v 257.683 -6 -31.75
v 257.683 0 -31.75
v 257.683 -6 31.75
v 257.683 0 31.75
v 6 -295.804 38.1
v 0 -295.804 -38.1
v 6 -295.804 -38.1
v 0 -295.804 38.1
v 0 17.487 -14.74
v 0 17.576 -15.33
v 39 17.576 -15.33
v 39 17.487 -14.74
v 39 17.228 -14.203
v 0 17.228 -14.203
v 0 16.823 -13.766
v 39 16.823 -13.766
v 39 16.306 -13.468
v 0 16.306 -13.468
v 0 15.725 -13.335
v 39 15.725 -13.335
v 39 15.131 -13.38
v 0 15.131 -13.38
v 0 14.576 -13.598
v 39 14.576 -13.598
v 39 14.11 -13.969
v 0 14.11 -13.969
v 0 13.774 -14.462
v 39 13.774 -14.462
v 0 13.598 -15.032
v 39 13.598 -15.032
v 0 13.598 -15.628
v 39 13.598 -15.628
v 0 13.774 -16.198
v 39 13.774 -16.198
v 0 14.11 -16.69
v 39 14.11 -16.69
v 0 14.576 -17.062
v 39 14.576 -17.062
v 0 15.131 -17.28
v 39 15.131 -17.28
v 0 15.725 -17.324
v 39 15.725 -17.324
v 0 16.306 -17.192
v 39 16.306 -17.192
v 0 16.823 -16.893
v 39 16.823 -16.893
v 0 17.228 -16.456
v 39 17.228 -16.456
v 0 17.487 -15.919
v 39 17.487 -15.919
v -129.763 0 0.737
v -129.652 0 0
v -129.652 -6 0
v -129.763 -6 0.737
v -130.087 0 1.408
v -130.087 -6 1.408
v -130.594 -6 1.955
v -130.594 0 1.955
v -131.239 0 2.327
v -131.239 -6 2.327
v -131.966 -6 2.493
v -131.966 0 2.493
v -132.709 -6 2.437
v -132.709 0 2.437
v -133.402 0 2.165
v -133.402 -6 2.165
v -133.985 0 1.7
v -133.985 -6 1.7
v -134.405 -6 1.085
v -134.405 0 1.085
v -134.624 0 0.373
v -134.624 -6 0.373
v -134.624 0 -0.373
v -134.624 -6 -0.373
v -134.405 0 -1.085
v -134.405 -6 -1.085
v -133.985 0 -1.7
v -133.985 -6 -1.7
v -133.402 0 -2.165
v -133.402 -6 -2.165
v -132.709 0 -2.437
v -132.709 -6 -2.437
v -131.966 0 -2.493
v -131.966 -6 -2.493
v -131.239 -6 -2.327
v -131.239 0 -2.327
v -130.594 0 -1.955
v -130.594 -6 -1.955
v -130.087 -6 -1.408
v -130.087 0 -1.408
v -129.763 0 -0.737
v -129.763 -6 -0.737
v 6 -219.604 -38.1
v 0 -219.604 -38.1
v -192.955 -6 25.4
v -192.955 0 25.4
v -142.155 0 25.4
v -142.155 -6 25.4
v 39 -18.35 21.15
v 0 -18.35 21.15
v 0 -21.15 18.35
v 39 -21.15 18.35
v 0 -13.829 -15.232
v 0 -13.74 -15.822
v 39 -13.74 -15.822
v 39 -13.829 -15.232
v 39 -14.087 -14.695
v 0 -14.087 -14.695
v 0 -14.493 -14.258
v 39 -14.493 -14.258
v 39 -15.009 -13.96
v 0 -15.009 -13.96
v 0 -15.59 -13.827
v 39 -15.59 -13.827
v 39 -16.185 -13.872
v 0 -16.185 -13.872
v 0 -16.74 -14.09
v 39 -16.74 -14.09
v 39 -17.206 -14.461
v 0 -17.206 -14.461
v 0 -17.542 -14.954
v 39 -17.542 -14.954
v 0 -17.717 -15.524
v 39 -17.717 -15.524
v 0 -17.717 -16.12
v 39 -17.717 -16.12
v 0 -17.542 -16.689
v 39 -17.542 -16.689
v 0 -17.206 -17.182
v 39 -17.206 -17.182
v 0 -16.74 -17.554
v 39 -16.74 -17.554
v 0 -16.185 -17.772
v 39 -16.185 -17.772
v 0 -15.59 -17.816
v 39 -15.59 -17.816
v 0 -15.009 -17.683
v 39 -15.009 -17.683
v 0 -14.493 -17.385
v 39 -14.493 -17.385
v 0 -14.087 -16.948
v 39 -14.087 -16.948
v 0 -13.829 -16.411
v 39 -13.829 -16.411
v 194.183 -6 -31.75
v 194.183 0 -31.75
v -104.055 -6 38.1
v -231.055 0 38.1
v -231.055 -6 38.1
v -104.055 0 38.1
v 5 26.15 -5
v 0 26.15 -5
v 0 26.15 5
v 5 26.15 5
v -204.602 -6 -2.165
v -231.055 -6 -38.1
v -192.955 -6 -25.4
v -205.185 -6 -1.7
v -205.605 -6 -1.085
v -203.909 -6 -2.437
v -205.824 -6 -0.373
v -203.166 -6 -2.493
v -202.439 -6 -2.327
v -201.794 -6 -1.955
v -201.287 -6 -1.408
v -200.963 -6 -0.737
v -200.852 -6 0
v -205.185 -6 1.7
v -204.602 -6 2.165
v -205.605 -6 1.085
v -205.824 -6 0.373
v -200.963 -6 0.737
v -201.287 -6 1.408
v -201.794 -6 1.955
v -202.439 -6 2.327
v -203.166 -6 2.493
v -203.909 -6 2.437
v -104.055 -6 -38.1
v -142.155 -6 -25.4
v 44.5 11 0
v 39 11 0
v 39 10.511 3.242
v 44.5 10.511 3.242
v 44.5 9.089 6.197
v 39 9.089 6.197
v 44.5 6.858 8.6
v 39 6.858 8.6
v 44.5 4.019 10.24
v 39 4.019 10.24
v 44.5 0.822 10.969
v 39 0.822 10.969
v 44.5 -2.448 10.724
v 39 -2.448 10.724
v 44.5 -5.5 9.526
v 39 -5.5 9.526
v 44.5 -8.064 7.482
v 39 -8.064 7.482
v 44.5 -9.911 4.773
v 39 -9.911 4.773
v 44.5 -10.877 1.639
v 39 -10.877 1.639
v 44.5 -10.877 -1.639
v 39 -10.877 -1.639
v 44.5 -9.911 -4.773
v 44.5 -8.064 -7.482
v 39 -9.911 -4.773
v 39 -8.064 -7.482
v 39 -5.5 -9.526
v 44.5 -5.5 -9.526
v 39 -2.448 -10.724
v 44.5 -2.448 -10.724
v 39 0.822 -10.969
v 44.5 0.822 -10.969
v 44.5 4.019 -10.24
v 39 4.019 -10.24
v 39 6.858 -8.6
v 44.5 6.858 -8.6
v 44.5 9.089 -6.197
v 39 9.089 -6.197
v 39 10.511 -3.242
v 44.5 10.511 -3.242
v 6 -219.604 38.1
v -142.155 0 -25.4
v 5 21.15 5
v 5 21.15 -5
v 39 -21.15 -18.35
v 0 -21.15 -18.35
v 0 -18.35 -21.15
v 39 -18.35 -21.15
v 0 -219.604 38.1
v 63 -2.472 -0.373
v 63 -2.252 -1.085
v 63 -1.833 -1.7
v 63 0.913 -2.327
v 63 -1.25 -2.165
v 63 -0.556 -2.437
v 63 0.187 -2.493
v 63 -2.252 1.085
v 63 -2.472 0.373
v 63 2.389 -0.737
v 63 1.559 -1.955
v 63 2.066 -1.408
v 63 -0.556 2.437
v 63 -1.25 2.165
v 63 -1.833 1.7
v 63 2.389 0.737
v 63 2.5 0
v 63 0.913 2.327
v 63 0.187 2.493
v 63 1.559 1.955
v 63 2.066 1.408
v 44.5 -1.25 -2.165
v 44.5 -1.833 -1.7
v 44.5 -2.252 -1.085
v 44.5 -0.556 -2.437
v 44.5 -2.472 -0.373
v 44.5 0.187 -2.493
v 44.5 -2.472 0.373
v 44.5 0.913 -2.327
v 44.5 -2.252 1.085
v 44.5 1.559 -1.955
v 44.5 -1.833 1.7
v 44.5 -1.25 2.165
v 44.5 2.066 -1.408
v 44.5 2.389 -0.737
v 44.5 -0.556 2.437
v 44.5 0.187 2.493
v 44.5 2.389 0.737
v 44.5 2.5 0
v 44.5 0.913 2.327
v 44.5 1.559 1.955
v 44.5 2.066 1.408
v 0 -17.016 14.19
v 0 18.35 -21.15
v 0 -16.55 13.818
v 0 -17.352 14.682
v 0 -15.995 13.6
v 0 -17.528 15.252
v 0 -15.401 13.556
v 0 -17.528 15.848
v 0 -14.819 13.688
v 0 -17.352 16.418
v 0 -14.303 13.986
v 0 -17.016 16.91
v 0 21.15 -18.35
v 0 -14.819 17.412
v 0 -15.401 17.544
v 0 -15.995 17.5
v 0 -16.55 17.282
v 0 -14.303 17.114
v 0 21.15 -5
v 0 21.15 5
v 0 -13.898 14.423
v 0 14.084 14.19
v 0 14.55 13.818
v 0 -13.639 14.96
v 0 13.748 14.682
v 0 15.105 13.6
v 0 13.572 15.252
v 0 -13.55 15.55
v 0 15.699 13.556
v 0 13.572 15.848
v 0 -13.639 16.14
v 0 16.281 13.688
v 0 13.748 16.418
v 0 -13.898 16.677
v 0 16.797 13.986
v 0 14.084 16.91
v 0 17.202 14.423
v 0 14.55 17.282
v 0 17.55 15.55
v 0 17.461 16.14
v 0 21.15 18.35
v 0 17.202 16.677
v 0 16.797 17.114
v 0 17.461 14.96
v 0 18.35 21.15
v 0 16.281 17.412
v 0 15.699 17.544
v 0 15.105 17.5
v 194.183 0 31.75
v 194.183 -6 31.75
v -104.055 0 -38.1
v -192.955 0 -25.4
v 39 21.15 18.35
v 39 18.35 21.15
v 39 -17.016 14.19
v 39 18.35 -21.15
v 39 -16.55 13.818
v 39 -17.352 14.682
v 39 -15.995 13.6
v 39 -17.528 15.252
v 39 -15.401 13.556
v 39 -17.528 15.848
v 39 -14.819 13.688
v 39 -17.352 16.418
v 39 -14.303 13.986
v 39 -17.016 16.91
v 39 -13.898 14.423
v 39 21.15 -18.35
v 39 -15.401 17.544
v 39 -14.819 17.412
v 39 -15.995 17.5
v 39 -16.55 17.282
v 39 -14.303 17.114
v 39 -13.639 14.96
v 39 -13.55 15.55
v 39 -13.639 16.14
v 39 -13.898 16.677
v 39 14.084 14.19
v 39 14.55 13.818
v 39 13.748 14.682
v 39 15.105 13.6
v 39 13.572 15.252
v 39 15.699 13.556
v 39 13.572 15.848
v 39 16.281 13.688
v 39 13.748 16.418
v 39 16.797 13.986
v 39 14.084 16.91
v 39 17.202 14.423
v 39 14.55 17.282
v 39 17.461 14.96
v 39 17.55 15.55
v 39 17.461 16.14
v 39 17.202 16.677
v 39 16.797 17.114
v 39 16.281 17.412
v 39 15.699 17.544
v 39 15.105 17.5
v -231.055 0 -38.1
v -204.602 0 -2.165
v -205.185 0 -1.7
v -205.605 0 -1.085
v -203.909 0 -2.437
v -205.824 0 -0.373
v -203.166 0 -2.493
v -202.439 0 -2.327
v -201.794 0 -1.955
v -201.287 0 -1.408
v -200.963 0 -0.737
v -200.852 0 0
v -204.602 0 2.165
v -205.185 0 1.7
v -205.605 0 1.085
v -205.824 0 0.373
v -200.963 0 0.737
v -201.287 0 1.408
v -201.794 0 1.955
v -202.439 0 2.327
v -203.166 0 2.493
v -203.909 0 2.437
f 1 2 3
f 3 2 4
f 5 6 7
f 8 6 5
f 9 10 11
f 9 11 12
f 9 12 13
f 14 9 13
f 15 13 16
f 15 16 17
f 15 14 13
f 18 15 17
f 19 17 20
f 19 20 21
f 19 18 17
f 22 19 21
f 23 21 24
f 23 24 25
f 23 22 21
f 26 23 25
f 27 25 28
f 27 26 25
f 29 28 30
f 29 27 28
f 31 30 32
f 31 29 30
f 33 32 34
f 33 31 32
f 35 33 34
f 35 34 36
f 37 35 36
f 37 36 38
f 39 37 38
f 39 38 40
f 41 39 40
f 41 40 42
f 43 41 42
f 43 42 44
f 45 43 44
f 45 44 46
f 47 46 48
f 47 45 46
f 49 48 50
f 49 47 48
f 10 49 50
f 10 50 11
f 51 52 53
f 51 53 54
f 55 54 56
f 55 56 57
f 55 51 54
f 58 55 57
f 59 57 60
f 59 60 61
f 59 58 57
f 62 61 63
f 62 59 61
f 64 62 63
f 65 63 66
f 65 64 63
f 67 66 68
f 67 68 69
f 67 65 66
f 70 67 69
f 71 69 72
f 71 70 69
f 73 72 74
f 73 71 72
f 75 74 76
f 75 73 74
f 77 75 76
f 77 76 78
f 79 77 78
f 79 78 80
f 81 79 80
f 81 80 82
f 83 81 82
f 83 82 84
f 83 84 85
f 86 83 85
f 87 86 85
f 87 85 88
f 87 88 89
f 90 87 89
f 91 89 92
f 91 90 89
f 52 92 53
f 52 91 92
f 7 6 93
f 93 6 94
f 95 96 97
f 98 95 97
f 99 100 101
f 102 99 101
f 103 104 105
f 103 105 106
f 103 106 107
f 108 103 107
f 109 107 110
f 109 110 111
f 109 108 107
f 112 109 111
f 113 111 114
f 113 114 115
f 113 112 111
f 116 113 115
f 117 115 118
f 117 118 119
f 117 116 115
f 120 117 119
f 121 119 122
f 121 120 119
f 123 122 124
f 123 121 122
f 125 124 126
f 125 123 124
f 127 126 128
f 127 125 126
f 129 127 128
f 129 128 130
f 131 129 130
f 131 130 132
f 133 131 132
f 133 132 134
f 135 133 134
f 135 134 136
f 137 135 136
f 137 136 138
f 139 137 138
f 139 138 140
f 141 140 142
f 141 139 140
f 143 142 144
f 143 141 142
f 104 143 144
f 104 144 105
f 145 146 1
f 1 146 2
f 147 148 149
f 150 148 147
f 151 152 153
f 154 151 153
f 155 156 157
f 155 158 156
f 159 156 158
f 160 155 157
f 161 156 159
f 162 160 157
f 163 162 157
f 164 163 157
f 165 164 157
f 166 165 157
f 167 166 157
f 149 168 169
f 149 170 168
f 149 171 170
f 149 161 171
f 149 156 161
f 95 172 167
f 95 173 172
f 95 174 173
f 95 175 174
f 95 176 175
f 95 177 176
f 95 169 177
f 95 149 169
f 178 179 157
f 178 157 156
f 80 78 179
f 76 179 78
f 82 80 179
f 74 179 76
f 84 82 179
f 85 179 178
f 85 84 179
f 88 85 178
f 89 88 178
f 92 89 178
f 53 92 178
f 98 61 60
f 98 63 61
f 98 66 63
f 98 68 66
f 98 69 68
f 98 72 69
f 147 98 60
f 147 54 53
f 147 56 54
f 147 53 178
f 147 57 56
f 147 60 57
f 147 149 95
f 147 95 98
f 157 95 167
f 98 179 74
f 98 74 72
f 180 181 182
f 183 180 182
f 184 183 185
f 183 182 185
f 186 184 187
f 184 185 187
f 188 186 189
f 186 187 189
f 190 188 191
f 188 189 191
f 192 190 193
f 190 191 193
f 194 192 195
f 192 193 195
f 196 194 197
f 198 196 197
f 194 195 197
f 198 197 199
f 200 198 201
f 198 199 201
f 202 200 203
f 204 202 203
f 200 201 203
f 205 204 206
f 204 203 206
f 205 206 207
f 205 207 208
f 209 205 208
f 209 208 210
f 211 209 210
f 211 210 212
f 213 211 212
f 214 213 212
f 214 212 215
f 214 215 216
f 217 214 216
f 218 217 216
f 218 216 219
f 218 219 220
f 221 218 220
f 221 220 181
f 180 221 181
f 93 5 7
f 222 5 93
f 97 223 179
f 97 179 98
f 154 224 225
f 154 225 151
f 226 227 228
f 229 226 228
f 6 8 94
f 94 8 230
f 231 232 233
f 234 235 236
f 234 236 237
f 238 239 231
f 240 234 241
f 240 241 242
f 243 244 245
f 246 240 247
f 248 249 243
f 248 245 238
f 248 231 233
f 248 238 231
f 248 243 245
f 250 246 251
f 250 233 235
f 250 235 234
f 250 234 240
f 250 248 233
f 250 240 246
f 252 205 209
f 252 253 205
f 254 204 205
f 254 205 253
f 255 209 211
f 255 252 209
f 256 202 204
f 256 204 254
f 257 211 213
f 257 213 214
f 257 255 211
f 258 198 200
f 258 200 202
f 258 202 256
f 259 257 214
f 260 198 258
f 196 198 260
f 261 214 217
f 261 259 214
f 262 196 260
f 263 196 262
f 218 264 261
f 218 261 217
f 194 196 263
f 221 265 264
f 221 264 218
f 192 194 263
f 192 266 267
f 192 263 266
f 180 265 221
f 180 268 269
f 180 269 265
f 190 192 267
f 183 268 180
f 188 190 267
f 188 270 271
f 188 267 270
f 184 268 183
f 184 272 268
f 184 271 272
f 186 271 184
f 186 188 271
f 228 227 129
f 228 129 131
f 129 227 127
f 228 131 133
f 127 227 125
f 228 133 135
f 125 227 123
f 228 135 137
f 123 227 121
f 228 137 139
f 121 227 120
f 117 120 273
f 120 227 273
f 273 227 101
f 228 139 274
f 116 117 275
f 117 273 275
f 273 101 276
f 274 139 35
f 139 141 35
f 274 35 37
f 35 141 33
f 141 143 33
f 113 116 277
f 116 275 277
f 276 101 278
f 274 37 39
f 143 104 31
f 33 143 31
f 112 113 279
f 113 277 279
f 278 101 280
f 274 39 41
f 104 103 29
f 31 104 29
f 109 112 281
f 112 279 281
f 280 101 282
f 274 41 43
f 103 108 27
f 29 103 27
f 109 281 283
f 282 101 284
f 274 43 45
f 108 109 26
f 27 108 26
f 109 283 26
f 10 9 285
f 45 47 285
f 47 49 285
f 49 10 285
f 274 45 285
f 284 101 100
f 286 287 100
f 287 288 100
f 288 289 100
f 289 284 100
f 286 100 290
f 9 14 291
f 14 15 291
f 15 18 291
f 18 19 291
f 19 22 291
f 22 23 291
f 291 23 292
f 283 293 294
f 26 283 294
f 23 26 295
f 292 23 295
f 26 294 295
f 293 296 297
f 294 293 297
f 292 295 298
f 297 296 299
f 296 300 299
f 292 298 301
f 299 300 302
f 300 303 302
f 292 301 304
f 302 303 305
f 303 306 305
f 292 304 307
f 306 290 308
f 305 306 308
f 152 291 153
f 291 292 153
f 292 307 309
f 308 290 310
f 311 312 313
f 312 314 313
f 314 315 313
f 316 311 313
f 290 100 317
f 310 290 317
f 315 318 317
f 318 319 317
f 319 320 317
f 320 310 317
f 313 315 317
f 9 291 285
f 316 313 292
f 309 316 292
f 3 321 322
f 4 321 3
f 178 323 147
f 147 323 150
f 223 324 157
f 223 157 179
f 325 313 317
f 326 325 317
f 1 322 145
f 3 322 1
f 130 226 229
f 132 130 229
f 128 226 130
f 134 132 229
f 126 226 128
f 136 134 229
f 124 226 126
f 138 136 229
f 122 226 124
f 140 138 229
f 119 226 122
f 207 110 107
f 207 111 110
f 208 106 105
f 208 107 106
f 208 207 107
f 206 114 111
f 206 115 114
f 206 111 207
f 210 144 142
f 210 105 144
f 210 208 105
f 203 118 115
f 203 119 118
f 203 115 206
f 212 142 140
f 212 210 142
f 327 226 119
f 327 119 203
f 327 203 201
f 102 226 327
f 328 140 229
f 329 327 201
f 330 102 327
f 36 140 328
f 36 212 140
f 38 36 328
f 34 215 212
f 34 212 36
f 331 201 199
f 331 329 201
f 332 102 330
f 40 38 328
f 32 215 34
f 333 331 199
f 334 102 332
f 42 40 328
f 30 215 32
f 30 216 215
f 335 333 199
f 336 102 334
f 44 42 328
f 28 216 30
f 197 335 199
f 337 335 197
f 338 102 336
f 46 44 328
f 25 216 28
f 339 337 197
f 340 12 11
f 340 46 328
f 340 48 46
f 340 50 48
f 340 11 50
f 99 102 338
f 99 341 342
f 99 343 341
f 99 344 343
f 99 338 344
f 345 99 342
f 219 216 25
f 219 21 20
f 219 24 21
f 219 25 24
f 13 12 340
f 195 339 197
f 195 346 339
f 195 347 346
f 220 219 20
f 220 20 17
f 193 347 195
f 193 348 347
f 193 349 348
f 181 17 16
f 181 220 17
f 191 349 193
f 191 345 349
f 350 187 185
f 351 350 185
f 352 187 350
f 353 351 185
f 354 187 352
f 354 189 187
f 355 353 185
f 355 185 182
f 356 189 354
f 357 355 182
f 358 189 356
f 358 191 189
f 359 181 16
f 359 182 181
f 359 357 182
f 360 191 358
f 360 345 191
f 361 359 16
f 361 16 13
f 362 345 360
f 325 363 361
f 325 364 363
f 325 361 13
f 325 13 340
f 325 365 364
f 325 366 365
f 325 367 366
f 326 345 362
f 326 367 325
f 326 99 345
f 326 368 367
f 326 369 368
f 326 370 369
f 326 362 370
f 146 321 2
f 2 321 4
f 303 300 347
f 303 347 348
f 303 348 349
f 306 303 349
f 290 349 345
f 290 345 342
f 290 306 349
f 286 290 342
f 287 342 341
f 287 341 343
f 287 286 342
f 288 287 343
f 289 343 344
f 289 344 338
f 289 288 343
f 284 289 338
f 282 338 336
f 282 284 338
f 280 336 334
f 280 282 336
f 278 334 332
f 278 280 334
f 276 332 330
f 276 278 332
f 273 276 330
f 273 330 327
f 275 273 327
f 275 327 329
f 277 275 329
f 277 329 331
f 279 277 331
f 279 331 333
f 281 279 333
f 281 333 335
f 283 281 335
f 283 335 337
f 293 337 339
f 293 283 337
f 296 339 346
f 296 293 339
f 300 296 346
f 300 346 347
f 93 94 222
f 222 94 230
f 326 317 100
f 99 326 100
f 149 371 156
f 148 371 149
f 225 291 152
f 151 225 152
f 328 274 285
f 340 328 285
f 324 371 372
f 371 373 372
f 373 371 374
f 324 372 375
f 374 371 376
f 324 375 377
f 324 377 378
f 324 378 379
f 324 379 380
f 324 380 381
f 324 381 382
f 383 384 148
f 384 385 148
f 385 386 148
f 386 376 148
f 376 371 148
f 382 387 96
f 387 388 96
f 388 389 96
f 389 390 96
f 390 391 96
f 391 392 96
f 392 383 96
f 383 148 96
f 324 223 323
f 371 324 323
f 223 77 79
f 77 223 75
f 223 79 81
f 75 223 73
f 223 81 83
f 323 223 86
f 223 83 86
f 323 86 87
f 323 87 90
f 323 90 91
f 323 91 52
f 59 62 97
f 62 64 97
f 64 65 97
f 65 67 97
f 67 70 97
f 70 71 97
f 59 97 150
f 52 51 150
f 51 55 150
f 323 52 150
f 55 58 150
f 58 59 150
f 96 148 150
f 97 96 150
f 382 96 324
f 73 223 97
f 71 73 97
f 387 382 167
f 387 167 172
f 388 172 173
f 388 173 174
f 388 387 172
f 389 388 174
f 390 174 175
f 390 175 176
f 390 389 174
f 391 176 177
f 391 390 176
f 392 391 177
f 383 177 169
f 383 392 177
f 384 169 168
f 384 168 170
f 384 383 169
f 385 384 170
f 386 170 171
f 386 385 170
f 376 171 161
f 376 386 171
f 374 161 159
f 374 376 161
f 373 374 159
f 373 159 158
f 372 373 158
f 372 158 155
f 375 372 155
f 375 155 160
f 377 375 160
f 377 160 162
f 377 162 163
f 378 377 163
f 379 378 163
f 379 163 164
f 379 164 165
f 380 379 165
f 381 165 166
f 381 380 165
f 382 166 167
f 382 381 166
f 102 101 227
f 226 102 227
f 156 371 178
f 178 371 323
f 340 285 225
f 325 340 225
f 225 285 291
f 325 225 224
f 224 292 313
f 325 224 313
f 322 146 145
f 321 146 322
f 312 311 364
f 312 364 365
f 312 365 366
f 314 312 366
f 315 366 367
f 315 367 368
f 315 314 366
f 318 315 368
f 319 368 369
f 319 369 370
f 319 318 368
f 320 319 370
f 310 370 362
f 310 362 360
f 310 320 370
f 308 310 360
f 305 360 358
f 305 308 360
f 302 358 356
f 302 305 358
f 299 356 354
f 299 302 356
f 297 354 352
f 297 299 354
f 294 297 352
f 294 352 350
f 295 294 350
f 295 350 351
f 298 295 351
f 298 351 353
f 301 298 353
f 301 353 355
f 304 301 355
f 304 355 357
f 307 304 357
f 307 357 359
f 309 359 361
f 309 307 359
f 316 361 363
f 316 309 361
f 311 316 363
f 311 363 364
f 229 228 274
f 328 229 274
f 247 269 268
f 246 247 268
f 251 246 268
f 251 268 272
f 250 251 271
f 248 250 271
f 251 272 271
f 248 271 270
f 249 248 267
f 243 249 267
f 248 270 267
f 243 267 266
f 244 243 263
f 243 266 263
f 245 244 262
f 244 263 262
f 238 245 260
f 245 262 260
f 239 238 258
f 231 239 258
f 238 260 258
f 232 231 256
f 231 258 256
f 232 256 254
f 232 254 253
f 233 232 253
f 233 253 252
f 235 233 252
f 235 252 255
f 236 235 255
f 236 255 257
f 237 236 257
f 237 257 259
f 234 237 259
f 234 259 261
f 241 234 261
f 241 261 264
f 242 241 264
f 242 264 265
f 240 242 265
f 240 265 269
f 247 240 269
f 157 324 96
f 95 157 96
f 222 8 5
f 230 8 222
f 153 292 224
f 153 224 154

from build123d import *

# Parameters (mm, degrees)
F0_R      = 2
F0_R_2    = 11
F0_R_3    = 2.5
F1_DEPTH  = 39
F0_W      = 5
F0_H      = 10
F2_DEPTH  = 5
F3_DEPTH  = 44.5
F4_DEPTH  = 63
F5_W      = 76.2
F5_H      = 76.2
F6_DEPTH  = 6
F7_W      = 127
F7_H      = 76.2
F7_R      = 2.5
F7_W_2    = 50.8
F7_H_2    = 50.8
F8_DEPTH  = 6
F9_W      = 63.5
F9_H      = 63.5
F10_DEPTH = 6


with BuildPart() as f1:
    # F0 (on Right) → F1 (new body)
    with BuildSketch(Plane.YZ):
        with BuildLine():
            Line((18.35, 21.15), (9.95, 21.15))
            Line((9.95, 21.15), (9.95, 13.76))
            ThreePointArc((9.95, 13.76), (11.065923, 11.065923), (13.76, 9.95))
            Line((13.76, 9.95), (21.15, 9.95))
            Line((21.15, 9.95), (21.15, 18.35))
            Line((21.15, 18.35), (18.35, 21.15))
        make_face()
        with Locations((15.55, 15.55)):
            Circle(F0_R, mode=Mode.SUBTRACT)
        with BuildLine():
            Line((9.95, -13.76), (9.95, -21.15))
            Line((9.95, -21.15), (18.35, -21.15))
            Line((18.35, -21.15), (21.15, -18.35))
            Line((21.15, -18.35), (21.15, -9.95))
            Line((21.15, -9.95), (13.76, -9.95))
            ThreePointArc((13.76, -9.95), (11.065923, -11.065923), (9.95, -13.76))
        make_face()
        with Locations((15.575716, -15.329785)):
            Circle(F0_R, mode=Mode.SUBTRACT)
        with BuildLine():
            Line((-21.15, -18.35), (-18.35, -21.15))
            Line((-18.35, -21.15), (-9.95, -21.15))
            Line((-9.95, -21.15), (-9.95, -13.76))
            ThreePointArc((-9.95, -13.76), (-11.065923, -11.065923), (-13.76, -9.95))
            Line((-13.76, -9.95), (-21.15, -9.95))
            Line((-21.15, -9.95), (-21.15, -18.35))
        make_face()
        with Locations((-15.739674, -15.821651)):
            Circle(F0_R, mode=Mode.SUBTRACT)
        with BuildLine():
            Line((-21.15, 18.35), (-21.15, 9.95))
            Line((-21.15, 9.95), (-13.76, 9.95))
            ThreePointArc((-13.76, 9.95), (-11.065923, 11.065923), (-9.95, 13.76))
            Line((-9.95, 13.76), (-9.95, 21.15))
            Line((-9.95, 21.15), (-18.35, 21.15))
            Line((-18.35, 21.15), (-21.15, 18.35))
        make_face()
        with Locations((-15.55, 15.55)):
            Circle(F0_R, mode=Mode.SUBTRACT)
        with BuildLine():
            Line((-9.95, -13.76), (-9.95, -21.15))
            Line((-9.95, -21.15), (9.95, -21.15))
            Line((9.95, -21.15), (9.95, -13.76))
            ThreePointArc((9.95, -13.76), (11.065923, -11.065923), (13.76, -9.95))
            Line((13.76, -9.95), (21.15, -9.95))
            Line((21.15, -9.95), (21.15, -5))
            Line((21.15, -5), (21.15, 5))
            Line((21.15, 5), (21.15, 9.95))
            Line((21.15, 9.95), (13.76, 9.95))
            ThreePointArc((13.76, 9.95), (11.065923, 11.065923), (9.95, 13.76))
            Line((9.95, 13.76), (9.95, 21.15))
            Line((9.95, 21.15), (-9.95, 21.15))
            Line((-9.95, 21.15), (-9.95, 13.76))
            ThreePointArc((-9.95, 13.76), (-11.065923, 11.065923), (-13.76, 9.95))
            Line((-13.76, 9.95), (-21.15, 9.95))
            Line((-21.15, 9.95), (-21.15, -9.95))
            Line((-21.15, -9.95), (-13.76, -9.95))
            ThreePointArc((-13.76, -9.95), (-11.065923, -11.065923), (-9.95, -13.76))
        make_face()
        Circle(F0_R_2, mode=Mode.SUBTRACT)
        Circle(F0_R_2)
        Circle(F0_R_3, mode=Mode.SUBTRACT)
        Circle(F0_R_3)
    extrude(amount=F1_DEPTH)

    # F0 (on Right) → F2 (join)
    with BuildSketch(Plane.YZ):
        with Locations((23.65, 0)):
            Rectangle(F0_W, F0_H)
    extrude(amount=F2_DEPTH)

    # F0 (on Right) → F3 (join)
    with BuildSketch(Plane.YZ):
        Circle(F0_R_2)
        Circle(F0_R_3, mode=Mode.SUBTRACT)
    extrude(amount=F3_DEPTH)

    # F0 (on Right) → F4 (join)
    with BuildSketch(Plane.YZ):
        Circle(F0_R_3)
    extrude(amount=F4_DEPTH)


with BuildPart() as f6:
    # F5 (on Right) → F6 (new body)
    with BuildSketch(Plane.YZ):
        with Locations((-257.704135, 0)):
            Rectangle(F5_W, F5_H)
    extrude(amount=F6_DEPTH)


with BuildPart() as f8:
    # F7 (on Front) → F8 (new body)
    with BuildSketch(Plane.XZ):
        with Locations((-167.554611, 0)):
            Rectangle(F7_W, F7_H)
        with Locations((-203.352407, 0)):
            Circle(F7_R, mode=Mode.SUBTRACT)
        with Locations((-167.554611, 0)):
            Rectangle(F7_W_2, F7_H_2, mode=Mode.SUBTRACT)
        with Locations((-132.152407, 0)):
            Circle(F7_R, mode=Mode.SUBTRACT)
    extrude(amount=F8_DEPTH)


with BuildPart() as f10:
    # F9 (on Front) → F10 (new body)
    with BuildSketch(Plane.XZ):
        with Locations((225.933054, 0)):
            Rectangle(F9_W, F9_H)
    extrude(amount=F10_DEPTH)


solid = Compound([f1.part, f6.part, f8.part, f10.part])
